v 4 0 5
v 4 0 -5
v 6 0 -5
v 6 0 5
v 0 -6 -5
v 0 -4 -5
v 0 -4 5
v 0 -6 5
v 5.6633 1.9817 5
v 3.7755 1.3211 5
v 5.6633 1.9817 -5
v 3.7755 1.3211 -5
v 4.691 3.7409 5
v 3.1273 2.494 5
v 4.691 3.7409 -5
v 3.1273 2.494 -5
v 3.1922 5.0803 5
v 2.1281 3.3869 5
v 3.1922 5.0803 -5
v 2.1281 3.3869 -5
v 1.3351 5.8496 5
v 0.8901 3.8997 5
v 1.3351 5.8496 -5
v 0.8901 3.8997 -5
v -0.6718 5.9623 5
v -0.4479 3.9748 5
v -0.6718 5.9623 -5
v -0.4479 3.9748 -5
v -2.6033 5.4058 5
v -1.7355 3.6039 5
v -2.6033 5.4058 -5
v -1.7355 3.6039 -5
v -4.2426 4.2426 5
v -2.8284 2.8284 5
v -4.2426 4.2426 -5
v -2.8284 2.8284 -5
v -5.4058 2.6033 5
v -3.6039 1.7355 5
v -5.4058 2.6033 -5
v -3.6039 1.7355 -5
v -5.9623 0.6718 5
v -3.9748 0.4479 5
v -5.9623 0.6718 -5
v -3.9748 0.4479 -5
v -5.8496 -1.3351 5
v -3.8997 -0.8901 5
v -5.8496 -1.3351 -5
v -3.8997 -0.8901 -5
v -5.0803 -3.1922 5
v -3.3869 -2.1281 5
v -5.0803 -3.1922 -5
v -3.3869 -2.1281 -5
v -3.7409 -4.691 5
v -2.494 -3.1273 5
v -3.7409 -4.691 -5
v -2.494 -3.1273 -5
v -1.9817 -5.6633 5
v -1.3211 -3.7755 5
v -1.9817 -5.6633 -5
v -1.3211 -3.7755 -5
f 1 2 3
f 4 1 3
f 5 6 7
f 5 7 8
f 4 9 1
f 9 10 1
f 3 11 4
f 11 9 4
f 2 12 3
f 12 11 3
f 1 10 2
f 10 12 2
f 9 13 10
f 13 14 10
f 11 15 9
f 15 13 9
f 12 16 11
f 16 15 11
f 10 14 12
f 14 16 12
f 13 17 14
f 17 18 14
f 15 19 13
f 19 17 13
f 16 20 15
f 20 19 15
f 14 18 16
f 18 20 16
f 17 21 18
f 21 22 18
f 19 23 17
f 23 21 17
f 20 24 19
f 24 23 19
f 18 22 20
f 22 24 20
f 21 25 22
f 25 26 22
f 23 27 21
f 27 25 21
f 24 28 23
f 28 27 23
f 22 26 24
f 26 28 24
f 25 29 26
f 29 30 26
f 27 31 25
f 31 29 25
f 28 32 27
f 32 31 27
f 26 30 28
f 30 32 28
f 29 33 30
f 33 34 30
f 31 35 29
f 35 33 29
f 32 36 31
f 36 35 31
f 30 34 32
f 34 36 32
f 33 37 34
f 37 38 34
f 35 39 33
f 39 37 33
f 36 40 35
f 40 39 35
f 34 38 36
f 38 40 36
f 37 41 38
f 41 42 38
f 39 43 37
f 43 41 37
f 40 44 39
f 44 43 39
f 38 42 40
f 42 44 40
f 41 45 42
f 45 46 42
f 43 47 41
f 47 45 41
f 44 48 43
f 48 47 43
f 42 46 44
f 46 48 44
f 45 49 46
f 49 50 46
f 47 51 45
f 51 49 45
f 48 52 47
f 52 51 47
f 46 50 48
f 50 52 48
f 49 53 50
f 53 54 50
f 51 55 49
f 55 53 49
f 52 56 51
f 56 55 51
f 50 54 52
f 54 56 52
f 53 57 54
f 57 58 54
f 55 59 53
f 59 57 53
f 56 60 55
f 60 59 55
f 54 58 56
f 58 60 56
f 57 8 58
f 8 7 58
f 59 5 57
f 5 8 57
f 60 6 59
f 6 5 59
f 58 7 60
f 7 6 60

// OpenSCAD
 
rotate_extrude( angle=270)
translate([5,0,0])
square([2,10], center=true);
